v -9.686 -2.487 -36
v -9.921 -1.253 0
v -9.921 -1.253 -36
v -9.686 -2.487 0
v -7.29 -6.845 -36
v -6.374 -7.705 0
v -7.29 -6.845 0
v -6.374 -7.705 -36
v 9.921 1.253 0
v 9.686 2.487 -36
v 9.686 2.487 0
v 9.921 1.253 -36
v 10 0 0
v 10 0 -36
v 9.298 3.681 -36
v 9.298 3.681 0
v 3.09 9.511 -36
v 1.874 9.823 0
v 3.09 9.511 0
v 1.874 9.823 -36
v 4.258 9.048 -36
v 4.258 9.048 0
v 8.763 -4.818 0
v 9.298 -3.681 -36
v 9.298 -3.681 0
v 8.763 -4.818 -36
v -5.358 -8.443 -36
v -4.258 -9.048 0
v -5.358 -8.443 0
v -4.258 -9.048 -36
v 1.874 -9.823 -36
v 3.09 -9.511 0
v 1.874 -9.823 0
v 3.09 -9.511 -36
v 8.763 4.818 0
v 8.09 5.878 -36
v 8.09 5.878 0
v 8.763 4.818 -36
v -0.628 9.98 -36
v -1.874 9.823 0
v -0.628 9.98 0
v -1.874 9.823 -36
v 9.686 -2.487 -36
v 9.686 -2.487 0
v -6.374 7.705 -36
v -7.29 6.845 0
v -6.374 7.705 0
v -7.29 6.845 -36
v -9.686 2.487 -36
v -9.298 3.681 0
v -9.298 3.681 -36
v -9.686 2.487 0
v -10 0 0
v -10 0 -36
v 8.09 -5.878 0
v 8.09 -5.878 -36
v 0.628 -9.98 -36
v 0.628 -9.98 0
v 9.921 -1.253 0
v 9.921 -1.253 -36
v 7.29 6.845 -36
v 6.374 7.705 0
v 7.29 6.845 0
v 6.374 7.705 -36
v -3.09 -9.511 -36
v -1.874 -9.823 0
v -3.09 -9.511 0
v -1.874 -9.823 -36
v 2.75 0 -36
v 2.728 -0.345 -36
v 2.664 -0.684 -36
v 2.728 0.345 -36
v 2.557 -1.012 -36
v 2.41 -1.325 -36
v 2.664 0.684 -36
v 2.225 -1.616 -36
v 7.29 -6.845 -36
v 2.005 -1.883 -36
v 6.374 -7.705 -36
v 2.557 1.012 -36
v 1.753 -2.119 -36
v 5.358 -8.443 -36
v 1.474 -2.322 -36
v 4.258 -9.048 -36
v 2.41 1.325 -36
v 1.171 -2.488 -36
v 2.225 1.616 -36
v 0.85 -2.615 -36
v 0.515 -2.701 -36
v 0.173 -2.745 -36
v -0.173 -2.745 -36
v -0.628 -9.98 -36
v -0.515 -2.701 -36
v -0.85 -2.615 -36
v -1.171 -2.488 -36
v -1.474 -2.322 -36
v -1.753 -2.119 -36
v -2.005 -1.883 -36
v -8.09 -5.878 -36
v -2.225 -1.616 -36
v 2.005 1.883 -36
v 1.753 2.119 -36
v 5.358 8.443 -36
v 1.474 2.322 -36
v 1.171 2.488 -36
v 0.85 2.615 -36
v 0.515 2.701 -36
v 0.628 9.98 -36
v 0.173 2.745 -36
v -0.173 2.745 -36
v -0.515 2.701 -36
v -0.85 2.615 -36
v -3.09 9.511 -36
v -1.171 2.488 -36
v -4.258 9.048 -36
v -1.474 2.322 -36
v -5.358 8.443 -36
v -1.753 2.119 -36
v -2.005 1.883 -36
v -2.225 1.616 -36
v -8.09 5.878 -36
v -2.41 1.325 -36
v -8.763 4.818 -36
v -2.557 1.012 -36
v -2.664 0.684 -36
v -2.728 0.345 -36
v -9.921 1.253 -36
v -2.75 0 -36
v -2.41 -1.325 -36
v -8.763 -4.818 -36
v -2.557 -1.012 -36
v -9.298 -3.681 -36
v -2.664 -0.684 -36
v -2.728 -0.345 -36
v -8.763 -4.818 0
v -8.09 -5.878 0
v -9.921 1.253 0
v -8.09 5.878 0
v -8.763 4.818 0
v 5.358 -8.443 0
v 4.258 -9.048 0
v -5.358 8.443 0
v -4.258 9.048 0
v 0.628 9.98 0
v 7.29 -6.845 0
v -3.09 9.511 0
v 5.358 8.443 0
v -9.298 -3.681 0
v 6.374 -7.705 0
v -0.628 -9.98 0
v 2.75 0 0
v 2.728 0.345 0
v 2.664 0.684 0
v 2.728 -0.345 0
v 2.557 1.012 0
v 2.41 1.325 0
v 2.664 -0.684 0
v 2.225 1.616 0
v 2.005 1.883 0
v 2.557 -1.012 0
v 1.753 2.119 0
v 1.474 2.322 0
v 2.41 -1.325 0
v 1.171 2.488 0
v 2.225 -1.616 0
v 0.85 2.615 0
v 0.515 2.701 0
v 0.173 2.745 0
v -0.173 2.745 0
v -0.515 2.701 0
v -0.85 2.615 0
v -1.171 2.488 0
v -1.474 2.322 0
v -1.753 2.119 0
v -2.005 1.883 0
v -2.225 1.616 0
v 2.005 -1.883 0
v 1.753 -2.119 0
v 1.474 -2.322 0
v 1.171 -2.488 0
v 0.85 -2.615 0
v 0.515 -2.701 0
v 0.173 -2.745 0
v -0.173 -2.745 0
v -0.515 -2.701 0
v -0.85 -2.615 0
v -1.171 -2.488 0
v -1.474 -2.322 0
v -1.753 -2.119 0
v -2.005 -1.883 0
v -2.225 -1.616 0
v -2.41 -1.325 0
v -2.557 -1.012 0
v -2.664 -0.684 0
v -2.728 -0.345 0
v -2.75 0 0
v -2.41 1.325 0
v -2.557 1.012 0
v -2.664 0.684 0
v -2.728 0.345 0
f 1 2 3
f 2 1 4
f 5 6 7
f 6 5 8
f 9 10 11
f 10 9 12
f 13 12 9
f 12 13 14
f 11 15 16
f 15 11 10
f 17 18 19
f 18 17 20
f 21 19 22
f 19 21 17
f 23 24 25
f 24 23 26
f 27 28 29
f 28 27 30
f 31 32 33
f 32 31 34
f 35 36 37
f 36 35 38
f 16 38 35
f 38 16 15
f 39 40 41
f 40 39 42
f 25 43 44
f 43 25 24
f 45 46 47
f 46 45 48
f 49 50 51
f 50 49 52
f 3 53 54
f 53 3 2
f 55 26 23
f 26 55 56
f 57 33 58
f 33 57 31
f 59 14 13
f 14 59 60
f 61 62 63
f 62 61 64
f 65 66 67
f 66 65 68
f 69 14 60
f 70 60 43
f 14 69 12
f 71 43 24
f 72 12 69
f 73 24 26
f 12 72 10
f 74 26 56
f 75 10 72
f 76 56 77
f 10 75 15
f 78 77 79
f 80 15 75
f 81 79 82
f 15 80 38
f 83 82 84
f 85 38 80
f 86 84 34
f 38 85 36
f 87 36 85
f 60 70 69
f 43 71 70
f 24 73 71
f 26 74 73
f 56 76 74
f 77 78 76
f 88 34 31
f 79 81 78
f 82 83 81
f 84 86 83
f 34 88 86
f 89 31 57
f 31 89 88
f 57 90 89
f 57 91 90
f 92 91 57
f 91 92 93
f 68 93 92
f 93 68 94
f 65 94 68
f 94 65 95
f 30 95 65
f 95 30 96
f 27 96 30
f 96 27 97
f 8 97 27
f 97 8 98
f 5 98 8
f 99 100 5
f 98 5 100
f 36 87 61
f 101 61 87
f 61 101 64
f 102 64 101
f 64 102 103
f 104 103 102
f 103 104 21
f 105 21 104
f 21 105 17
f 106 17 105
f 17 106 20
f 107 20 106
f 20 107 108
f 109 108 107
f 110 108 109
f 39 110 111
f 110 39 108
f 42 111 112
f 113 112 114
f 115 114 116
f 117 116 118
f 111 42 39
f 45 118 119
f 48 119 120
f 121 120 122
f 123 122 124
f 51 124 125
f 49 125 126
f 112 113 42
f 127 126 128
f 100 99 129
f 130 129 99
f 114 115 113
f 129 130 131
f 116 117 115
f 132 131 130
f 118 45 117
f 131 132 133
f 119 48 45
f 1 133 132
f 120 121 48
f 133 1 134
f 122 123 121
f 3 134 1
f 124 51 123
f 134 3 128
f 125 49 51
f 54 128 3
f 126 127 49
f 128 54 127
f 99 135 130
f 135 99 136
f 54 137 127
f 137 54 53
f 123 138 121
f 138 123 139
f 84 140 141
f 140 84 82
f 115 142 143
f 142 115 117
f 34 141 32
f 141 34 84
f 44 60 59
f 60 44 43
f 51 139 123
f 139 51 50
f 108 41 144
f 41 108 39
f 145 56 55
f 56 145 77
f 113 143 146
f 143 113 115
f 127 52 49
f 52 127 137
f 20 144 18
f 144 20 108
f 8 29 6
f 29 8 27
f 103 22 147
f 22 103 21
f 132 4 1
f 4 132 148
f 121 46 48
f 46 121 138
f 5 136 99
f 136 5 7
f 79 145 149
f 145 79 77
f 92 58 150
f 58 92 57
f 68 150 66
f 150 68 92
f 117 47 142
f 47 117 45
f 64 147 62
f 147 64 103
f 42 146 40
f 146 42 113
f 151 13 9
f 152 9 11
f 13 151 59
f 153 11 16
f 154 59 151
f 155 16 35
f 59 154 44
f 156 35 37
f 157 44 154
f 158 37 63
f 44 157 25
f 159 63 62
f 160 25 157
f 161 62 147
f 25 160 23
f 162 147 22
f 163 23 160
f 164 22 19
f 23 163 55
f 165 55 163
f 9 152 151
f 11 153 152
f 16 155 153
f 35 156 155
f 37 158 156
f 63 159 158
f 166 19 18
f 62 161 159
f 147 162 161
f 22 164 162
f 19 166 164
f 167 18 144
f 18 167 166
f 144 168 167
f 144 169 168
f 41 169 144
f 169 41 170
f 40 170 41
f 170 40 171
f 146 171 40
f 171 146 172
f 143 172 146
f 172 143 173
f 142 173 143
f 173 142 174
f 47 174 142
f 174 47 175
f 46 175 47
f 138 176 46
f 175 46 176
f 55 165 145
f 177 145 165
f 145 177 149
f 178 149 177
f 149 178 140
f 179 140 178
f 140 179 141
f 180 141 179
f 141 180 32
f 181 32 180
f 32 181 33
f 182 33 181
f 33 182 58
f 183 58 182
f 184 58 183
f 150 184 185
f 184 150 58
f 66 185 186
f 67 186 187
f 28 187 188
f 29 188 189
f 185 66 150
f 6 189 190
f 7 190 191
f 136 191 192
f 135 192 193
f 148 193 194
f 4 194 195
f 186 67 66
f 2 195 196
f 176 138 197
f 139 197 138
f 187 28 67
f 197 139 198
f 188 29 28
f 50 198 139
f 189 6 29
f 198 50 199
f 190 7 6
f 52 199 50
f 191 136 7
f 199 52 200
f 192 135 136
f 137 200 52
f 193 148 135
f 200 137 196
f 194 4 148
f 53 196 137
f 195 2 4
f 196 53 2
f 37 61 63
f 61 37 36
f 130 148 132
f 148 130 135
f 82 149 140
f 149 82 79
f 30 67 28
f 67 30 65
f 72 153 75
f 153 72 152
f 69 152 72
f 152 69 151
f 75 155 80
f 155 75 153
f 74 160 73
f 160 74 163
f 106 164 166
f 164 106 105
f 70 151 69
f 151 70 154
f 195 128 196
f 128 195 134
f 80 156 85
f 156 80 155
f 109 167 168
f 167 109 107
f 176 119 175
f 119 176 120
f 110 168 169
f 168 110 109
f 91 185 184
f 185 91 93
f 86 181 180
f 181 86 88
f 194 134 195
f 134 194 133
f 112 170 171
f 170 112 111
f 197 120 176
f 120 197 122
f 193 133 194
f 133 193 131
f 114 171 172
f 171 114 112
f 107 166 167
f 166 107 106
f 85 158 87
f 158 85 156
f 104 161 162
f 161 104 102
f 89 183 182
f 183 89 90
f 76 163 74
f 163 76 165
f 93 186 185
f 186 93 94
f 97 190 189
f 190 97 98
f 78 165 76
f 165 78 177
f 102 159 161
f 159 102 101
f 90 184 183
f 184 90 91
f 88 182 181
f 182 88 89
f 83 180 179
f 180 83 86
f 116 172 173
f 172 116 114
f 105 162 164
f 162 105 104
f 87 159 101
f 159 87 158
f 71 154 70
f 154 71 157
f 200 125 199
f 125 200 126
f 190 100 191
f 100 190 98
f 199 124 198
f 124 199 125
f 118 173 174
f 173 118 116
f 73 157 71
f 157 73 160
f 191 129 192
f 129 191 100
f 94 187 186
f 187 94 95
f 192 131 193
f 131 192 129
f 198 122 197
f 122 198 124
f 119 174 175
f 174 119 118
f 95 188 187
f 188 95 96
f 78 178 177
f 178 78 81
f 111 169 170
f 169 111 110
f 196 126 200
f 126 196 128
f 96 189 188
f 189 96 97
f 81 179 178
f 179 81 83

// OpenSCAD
$fn = 50;


difference() {
	union() {
		translate(v = [0, 0, -36.0000000000]) {
			cylinder(h = 36, r = 10.0000000000);
		}
		cylinder(h = 0, r = 19.0000000000);
	}
	union() {
		#translate(v = [0, 0, -36]) {
			cylinder(h = 36, r = 2.7500000000);
		}
	}
}
